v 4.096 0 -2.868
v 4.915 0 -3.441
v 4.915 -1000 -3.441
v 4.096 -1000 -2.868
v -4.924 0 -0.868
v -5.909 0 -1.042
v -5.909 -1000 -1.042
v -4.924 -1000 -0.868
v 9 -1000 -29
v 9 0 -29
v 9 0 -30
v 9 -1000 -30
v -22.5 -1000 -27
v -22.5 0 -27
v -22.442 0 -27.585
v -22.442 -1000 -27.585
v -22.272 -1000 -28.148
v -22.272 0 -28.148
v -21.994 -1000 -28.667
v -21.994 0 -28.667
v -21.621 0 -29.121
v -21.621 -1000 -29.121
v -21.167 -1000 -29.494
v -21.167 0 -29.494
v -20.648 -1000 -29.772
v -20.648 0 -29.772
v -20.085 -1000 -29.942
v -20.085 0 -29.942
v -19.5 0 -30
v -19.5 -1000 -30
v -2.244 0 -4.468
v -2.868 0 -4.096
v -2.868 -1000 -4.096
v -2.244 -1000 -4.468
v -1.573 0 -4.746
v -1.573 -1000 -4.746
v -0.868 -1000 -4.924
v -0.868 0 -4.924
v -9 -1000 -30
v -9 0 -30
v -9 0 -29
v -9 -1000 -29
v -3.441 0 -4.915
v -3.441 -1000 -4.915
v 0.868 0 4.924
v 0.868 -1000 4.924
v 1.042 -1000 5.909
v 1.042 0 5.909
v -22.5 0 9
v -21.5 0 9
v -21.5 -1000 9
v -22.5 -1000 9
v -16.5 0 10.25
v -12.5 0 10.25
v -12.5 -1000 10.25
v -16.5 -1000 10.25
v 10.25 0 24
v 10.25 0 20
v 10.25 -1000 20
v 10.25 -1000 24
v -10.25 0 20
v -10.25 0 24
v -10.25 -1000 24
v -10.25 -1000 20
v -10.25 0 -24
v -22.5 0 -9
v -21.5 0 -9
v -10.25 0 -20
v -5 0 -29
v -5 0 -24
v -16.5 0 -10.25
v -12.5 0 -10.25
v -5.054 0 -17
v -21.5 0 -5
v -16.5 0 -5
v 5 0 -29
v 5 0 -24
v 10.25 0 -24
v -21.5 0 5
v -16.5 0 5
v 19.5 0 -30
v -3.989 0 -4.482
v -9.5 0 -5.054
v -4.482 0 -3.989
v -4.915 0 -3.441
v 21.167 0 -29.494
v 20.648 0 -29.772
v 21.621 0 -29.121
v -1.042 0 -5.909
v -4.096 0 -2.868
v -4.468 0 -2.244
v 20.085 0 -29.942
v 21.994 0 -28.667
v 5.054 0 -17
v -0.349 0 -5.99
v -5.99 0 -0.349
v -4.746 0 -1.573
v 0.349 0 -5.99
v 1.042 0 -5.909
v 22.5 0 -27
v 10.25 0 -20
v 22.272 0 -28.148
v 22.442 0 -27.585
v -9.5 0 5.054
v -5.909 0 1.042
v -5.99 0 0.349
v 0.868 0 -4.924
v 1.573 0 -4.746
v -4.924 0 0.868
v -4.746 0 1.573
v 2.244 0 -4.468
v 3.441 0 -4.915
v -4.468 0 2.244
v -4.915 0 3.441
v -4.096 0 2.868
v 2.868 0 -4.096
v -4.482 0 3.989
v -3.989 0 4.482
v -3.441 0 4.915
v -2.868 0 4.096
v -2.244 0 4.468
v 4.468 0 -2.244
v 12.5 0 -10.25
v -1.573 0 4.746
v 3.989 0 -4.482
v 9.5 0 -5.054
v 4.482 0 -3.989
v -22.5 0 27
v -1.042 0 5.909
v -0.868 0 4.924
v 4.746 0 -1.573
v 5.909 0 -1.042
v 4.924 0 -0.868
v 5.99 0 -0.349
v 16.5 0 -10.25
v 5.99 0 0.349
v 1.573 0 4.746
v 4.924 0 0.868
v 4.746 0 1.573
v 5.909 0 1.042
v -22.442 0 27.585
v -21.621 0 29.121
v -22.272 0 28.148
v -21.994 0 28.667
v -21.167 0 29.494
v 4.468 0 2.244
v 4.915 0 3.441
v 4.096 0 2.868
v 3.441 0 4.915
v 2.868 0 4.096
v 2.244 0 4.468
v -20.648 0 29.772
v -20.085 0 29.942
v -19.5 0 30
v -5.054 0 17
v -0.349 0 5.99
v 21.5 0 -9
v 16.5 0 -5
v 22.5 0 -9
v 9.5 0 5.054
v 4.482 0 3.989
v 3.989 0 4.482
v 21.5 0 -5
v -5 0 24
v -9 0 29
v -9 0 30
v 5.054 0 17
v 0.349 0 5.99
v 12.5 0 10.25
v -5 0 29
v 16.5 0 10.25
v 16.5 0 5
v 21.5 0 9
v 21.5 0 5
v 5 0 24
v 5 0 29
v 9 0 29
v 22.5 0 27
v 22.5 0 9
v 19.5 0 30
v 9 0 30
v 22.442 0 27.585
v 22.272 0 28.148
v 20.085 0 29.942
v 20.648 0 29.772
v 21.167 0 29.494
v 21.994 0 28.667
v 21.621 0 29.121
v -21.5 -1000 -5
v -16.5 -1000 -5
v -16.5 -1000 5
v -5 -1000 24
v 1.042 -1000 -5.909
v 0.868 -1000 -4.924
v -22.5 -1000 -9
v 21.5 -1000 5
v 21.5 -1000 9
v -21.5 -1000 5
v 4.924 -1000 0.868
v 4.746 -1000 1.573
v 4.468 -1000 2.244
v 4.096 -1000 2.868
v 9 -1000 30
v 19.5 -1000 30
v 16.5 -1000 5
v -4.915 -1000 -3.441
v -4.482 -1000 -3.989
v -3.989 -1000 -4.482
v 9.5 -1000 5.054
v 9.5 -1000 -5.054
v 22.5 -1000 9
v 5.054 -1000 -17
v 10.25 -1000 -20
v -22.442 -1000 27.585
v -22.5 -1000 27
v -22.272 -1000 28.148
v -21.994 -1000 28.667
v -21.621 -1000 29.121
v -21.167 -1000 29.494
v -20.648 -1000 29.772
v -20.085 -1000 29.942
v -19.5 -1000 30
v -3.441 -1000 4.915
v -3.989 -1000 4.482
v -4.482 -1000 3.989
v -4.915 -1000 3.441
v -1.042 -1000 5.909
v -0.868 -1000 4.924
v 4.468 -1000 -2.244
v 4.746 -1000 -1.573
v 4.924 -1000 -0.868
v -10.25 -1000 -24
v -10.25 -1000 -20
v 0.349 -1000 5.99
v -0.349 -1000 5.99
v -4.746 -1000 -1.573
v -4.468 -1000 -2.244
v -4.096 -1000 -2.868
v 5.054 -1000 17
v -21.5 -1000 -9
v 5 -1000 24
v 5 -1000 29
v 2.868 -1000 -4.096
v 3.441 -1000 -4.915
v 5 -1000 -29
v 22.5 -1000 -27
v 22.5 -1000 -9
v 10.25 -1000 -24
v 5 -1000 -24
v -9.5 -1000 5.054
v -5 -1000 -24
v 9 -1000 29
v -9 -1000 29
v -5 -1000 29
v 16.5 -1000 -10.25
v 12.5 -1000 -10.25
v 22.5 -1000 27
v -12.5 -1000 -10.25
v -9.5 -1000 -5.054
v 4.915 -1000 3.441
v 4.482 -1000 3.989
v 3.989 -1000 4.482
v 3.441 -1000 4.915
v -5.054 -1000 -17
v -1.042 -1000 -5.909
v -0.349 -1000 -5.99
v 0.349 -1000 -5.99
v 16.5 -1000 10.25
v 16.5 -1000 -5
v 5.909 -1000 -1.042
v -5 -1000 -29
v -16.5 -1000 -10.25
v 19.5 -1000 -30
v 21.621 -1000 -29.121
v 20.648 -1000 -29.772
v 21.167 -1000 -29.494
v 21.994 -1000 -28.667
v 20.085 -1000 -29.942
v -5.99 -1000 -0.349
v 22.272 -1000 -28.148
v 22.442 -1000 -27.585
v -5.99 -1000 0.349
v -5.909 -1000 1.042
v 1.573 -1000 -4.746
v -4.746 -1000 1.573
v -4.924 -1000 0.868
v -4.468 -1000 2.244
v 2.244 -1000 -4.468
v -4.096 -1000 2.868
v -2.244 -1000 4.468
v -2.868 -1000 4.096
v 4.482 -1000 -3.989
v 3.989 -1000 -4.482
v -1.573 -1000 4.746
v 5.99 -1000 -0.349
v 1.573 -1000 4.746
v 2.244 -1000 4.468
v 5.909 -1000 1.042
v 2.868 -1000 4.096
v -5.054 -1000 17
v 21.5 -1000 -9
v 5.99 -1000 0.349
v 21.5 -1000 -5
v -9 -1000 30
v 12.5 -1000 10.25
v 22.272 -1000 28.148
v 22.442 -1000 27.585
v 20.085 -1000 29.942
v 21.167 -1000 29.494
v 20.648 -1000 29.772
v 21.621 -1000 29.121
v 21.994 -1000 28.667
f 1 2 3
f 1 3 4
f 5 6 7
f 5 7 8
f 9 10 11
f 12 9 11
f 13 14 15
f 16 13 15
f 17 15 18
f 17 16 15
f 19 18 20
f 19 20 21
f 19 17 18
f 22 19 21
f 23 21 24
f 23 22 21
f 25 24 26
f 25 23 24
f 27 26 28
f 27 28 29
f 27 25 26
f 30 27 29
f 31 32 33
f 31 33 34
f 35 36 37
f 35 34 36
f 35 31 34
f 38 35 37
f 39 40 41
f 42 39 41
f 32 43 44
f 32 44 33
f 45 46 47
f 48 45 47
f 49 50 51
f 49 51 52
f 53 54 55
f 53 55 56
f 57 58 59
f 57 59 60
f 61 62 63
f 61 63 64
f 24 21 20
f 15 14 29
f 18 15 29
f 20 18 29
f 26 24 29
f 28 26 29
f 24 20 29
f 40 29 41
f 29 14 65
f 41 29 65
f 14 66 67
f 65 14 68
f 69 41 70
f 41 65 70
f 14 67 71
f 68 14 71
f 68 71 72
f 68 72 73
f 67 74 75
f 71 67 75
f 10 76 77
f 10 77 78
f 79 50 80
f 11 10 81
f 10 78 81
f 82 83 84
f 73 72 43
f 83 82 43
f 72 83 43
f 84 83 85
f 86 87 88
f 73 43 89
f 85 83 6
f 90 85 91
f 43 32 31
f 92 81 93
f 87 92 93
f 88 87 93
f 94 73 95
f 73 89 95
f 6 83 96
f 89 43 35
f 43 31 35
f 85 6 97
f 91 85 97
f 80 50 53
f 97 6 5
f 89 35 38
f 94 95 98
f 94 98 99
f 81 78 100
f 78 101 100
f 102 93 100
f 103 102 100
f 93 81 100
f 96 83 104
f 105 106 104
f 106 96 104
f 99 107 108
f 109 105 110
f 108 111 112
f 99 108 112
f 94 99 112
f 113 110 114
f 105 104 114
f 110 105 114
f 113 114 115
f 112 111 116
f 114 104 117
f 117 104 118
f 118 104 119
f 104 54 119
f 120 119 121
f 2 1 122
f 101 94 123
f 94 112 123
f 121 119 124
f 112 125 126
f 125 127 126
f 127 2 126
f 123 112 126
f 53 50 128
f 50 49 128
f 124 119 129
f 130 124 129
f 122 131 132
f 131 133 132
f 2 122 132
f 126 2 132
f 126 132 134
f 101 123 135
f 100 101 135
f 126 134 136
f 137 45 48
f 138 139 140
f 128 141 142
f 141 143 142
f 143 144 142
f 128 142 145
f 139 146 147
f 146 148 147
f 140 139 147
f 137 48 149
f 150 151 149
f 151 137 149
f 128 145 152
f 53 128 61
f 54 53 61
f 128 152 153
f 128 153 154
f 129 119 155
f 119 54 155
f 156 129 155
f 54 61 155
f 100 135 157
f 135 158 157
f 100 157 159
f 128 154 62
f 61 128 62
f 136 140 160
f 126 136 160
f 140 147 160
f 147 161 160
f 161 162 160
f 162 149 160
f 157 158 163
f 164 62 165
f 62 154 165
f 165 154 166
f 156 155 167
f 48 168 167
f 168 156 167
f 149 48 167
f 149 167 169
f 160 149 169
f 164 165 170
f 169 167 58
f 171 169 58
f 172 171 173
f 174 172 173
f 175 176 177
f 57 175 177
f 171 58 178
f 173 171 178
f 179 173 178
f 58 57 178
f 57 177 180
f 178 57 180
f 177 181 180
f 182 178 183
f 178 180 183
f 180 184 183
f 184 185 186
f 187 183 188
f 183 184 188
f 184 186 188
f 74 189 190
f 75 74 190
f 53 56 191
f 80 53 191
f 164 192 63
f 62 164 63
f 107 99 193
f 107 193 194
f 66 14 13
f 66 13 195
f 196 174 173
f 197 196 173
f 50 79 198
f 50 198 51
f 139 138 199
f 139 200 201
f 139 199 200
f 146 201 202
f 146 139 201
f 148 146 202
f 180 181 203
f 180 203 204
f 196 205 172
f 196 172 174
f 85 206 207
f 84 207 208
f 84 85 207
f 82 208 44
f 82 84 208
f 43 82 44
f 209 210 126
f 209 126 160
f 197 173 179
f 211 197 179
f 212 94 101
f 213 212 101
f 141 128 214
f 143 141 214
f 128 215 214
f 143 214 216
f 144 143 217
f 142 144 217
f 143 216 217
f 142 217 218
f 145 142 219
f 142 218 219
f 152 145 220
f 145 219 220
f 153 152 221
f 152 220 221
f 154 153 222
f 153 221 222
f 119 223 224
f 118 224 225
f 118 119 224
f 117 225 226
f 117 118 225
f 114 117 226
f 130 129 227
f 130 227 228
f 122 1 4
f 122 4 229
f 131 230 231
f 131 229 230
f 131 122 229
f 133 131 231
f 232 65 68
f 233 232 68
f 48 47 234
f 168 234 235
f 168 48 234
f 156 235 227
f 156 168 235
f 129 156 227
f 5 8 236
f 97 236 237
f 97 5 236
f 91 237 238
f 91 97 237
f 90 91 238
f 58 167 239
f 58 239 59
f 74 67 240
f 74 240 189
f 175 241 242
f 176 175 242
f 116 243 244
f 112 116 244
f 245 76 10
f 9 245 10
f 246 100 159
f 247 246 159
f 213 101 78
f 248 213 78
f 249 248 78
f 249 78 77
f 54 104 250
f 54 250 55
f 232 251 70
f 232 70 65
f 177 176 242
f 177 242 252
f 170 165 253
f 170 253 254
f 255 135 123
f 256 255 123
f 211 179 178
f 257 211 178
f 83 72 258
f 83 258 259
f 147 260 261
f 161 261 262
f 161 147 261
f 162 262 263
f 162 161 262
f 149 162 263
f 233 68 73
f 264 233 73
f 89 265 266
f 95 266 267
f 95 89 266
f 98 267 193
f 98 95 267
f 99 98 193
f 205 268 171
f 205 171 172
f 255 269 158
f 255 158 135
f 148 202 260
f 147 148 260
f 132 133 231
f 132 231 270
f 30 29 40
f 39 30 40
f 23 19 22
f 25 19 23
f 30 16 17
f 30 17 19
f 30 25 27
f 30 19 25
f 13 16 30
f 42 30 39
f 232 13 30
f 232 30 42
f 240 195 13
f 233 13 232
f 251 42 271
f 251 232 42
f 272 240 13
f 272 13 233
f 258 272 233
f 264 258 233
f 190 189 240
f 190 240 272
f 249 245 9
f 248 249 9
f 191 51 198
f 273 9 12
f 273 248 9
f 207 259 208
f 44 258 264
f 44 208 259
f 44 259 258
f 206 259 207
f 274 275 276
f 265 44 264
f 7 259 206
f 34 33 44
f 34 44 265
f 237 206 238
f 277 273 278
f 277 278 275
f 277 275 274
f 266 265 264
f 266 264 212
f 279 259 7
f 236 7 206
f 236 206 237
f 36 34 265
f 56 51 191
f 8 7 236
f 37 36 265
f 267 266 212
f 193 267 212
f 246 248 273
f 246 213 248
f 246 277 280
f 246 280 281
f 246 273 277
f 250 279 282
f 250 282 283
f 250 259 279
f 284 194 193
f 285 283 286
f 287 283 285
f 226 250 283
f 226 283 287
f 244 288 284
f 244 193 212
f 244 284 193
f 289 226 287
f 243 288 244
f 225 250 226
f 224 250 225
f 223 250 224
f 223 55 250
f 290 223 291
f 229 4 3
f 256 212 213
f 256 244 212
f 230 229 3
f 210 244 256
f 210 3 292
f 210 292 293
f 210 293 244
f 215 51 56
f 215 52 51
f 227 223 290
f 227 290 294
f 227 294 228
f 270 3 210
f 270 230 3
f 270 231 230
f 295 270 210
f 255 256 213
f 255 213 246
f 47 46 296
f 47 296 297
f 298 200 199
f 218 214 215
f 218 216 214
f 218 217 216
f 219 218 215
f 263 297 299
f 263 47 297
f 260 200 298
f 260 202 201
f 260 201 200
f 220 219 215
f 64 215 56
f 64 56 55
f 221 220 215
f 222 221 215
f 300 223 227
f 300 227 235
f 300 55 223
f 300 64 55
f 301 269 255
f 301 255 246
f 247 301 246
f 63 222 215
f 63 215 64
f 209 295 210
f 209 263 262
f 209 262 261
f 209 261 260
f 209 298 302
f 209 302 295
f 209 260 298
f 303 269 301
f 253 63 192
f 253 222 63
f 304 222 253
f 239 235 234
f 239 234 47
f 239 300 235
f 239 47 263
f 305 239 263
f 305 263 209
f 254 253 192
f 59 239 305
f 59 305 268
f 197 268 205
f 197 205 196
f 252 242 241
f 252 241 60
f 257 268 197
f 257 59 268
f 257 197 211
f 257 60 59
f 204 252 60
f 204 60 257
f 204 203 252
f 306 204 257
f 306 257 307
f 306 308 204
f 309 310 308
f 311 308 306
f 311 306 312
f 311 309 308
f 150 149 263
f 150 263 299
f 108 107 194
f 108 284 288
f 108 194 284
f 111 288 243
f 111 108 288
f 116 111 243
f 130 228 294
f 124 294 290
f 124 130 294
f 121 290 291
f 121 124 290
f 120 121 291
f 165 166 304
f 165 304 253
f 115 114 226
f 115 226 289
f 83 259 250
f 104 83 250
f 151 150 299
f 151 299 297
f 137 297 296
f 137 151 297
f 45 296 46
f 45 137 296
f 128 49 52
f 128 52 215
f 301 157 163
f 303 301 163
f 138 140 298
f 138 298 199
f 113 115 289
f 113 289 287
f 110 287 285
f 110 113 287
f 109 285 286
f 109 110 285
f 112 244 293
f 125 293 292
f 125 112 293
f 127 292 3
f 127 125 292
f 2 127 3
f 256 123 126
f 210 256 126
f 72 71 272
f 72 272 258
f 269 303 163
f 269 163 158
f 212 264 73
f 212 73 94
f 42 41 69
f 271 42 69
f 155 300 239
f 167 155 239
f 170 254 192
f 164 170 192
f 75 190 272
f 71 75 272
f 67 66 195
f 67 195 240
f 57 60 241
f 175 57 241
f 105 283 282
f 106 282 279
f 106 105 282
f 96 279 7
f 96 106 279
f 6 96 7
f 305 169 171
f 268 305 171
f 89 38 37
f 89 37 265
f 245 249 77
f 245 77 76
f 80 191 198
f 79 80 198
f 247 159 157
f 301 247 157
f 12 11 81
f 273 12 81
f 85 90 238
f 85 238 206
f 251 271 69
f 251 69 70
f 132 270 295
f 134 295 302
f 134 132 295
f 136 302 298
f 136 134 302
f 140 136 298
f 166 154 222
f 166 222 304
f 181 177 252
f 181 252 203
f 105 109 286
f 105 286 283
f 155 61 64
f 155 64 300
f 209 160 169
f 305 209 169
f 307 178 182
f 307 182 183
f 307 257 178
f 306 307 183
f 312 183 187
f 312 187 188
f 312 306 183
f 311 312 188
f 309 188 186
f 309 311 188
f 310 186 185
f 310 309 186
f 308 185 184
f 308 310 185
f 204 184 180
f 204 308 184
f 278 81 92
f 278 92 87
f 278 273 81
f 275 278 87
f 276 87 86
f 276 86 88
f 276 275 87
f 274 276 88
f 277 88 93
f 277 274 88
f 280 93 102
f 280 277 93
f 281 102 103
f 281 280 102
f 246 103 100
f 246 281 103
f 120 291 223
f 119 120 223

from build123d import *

# Parameters (mm, degrees)
F0_W             = 45
F0_H             = 60
F1_DEPTH         = 1000
F2_R             = 3
F3_R             = 5
F4_DEPTH         = 1000.001
F6_DEPTH         = 1000.001
F8_DEPTH         = 1000.001
F10_DEPTH        = 1000.001
F10_COPIES_COUNT = 8


# Not quite as in the source:
# - a pattern or mirror of a feature is missing from the dataset's text; its kind, count and spacing are read off the source's solid


with BuildPart() as f1:
    # F0 (on Front) → F1 (new body)
    with BuildSketch(Plane.XZ):
        Rectangle(F0_W, F0_H)
    extrude(amount=F1_DEPTH)

    # F2
    f2_edges = [f1.edges().sort_by_distance(p)[0] for p in [
        (-22.5, -500, -30),
        (-22.5, -500, 30),
        (22.5, -500, -30),
        (22.5, -500, 30),
    ]]
    fillet(f2_edges, radius=F2_R)

    # F3 (on Front) → F4 (cut, through all)
    with BuildSketch(Plane.XZ):
        Circle(F3_R)
    extrude(amount=F4_DEPTH, mode=Mode.SUBTRACT)

    # F5 (on Front) → F6 (cut, through all)
    with BuildSketch(Plane.XZ):
        Polygon((9, 30), (-9, 30), (-9, 29), (-5, 29), (-5, 24), (-10.25, 24), (-10.25, 20), (-5.0538475773, 17), (5.0538475773, 17), (10.25, 20), (10.25, 24), (5, 24), (5, 29), (9, 29), align=None)
    f6 = extrude(amount=F6_DEPTH, mode=Mode.SUBTRACT)

    # F6_copies: F6 across plane
    add(f6.mirror(Plane(origin=(0, 0, 0), x_dir=(-1, 0, 0), z_dir=(0, 0, -1))), mode=Mode.SUBTRACT)

    # F7 (on Front) → F8 (cut, through all)
    with BuildSketch(Plane.XZ):
        Polygon((-21.5, 9), (-22.5, 9), (-22.5, -9), (-21.5, -9), (-21.5, -5), (-16.5, -5), (-16.5, -10.25), (-12.5, -10.25), (-9.5, -5.0538475773), (-9.5, 5.0538475773), (-12.5, 10.25), (-16.5, 10.25), (-16.5, 5), (-21.5, 5), align=None)
    f8 = extrude(amount=F8_DEPTH, mode=Mode.SUBTRACT)

    # F8_copies: F8 across plane
    add(f8.mirror(Plane(origin=(0, 0, 0), x_dir=(0, 0, 1), z_dir=(1, 0, 0))), mode=Mode.SUBTRACT)

    # F9 (on Front) → F10 (cut, through all)
    with BuildSketch(Plane.XZ):
        with BuildLine():
            Line((0, 0), (1.041889066, 5.9088465181))
            ThreePointArc((1.041889066, 5.9088465181), (0, 6), (-1.041889066, 5.9088465181))
            Line((-1.041889066, 5.9088465181), (0, 0))
        make_face()
    f10 = extrude(amount=F10_DEPTH, mode=Mode.SUBTRACT)

    # F10_copies: F10 ×8 about axis
    f10_copies_axis = Axis((0, 0, 0), (0, 1, 0))
    for i in range(1, F10_COPIES_COUNT):
        add(f10.rotate(f10_copies_axis, i * 360 / F10_COPIES_COUNT), mode=Mode.SUBTRACT)


solid = f1.part
